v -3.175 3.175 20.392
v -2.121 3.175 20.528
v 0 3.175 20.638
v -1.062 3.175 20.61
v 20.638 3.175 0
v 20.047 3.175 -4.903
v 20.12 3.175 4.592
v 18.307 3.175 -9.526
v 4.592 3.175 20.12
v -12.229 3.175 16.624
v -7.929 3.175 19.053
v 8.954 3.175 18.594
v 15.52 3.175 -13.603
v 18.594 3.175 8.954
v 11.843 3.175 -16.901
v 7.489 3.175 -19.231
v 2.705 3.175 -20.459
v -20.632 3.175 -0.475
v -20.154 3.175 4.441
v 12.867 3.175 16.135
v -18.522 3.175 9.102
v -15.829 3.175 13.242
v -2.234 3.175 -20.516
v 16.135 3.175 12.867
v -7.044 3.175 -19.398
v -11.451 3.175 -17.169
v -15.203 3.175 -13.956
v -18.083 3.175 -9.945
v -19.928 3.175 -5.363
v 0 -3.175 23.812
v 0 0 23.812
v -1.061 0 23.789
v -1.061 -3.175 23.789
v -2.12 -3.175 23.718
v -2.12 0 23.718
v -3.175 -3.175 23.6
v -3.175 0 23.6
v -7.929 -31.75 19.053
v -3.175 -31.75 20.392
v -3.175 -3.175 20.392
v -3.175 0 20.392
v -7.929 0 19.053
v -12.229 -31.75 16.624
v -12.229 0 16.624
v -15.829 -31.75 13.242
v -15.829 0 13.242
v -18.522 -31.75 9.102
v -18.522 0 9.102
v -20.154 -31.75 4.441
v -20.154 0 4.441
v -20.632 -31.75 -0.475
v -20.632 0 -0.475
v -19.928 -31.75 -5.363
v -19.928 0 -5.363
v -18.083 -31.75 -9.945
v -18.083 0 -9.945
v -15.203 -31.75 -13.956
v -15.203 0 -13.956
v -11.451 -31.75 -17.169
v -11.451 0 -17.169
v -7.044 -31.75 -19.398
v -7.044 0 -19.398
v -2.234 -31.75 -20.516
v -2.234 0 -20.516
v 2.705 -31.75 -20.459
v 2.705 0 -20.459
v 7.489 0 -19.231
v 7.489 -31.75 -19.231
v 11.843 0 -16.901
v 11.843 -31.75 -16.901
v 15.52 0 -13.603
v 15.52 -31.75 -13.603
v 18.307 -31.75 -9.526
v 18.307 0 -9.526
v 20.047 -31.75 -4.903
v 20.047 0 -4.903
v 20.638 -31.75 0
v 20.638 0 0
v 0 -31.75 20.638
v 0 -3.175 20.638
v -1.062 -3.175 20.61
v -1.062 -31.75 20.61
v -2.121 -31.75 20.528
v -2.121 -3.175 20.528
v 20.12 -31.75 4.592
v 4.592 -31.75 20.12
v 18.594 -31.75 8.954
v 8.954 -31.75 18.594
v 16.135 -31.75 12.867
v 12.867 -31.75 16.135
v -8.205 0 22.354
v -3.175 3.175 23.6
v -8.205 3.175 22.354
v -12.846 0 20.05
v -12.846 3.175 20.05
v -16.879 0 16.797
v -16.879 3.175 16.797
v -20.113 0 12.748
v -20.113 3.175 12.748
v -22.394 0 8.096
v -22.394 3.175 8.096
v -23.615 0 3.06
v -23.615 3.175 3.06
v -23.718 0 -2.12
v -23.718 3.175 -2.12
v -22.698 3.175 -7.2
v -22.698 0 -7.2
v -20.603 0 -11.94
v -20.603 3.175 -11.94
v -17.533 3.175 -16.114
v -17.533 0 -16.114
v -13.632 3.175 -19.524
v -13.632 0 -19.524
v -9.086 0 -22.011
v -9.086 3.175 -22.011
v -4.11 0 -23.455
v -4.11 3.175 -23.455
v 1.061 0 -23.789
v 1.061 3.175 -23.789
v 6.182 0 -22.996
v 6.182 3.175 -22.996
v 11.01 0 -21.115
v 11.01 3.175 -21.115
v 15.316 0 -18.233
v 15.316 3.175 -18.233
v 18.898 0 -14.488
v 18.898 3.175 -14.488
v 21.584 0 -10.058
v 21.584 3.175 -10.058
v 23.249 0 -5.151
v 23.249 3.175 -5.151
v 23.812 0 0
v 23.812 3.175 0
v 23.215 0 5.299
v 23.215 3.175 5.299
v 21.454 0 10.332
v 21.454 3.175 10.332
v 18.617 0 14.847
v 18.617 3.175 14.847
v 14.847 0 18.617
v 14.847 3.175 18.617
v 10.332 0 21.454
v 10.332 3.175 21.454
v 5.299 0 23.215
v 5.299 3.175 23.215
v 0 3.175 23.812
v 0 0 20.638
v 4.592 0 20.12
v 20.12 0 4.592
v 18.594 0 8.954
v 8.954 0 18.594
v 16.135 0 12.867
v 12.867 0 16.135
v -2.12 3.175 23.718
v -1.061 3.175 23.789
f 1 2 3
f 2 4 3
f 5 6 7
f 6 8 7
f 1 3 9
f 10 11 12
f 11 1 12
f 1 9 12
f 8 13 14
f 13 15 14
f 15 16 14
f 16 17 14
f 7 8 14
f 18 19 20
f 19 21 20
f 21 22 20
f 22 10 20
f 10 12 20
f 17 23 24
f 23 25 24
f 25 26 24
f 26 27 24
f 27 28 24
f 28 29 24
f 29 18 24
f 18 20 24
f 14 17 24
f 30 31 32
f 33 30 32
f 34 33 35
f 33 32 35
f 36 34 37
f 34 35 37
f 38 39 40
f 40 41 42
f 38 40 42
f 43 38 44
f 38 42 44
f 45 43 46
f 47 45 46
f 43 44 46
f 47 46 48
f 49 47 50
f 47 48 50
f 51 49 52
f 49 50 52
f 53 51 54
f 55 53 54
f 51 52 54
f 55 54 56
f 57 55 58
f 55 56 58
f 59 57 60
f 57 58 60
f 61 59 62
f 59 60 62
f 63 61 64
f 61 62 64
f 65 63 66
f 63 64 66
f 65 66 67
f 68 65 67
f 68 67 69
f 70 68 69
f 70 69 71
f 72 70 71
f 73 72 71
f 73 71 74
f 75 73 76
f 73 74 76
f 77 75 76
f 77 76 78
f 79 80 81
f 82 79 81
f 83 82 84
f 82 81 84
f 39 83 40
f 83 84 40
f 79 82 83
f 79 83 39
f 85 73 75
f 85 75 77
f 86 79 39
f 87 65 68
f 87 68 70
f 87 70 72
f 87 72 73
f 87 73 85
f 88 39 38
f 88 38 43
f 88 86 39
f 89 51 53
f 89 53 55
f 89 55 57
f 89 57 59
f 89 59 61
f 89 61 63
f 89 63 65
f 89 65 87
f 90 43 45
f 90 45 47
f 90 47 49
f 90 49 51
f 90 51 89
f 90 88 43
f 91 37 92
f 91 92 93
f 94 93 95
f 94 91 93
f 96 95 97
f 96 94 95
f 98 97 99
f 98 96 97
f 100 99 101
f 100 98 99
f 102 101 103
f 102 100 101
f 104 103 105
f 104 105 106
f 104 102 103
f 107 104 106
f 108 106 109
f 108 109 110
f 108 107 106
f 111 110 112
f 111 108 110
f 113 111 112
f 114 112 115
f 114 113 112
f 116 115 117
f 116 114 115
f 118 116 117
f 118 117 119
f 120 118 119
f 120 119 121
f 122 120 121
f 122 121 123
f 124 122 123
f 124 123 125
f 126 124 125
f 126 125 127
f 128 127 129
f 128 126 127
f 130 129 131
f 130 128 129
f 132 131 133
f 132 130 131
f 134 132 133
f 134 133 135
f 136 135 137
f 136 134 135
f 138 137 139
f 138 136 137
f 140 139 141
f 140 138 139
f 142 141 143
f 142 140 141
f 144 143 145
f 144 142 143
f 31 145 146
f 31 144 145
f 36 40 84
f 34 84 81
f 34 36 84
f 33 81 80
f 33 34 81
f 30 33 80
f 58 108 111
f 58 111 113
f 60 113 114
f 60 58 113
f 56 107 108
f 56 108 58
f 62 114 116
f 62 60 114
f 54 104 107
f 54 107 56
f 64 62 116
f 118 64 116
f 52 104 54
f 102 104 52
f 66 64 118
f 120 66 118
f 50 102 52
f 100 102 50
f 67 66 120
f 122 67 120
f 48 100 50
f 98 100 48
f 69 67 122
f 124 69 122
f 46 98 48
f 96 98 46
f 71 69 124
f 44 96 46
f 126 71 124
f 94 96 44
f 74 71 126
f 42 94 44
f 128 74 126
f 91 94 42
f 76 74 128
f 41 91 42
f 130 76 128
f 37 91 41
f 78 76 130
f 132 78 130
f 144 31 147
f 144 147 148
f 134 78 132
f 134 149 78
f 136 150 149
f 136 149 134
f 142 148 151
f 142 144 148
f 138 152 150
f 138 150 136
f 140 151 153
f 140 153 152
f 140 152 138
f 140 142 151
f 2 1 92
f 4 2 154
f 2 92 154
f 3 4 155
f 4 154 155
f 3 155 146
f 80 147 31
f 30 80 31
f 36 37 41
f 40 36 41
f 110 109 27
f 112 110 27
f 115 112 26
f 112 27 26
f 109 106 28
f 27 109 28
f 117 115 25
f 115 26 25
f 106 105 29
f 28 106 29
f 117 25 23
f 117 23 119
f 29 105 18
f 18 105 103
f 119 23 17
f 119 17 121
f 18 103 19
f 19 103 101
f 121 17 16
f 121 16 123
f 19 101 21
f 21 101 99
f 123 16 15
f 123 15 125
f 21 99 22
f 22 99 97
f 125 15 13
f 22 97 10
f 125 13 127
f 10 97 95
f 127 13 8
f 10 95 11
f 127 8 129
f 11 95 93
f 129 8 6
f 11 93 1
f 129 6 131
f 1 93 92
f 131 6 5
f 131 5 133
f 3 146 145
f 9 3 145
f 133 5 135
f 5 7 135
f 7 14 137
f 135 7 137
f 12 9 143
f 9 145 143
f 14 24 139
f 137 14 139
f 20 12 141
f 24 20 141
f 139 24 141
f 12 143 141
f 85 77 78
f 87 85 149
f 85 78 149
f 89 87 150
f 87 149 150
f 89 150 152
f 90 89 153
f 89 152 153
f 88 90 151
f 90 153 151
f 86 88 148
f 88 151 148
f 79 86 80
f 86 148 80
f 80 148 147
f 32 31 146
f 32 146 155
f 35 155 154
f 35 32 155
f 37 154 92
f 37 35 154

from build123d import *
from build123d import SkipClean  # not in build123d's __all__

# Parameters (mm, degrees)
F3_DEPTH = 3.175
F4_DEPTH = 31.75
F5_DEPTH = 3.175
F6_DEPTH = 3.175


# Not quite as in the source:
# - a length typed as a fraction of an inch, garbled in the dataset ("3 / 203.2 mm" for 3/8 in), is restored


with BuildPart() as f3:
    # F2 (on Front) → F3 (new body)
    with BuildSketch(Plane.XZ):
        with BuildLine():
            Line((-3.175, 23.5998841364), (-3.175, 20.3918067186))
            ThreePointArc((-3.175, 20.3918067186), (-1.5922460699, 20.5759849996), (0, 20.6375))
            Line((0, 20.6375), (0, 23.8125))
            ThreePointArc((0, 23.8125), (-1.591055507, 23.7592865765), (-3.175, 23.5998841364))
        make_face()
        with BuildLine():
            ThreePointArc((20.6375, 0), (-13.4235305294, -15.6753065161), (-3.175, 20.3918067186))
            Line((-3.175, 20.3918067186), (-3.175, 23.5998841364))
            ThreePointArc((-3.175, 23.5998841364), (-15.6753065161, -17.9253987926), (23.8125, 0))
            ThreePointArc((23.8125, 0), (16.837980227, 16.837980227), (0, 23.8125))
            Line((0, 23.8125), (0, 20.6375))
            ThreePointArc((0, 20.6375), (14.5929161967, 14.5929161967), (20.6375, 0))
        make_face()
    extrude(amount=-F3_DEPTH)

    # F2 (on Front) → F4 (join)
    with BuildSketch(Plane.XZ):
        with BuildLine():
            ThreePointArc((0, 20.6375), (-1.5922460699, 20.5759849996), (-3.175, 20.3918067186))
            ThreePointArc((-3.175, 20.3918067186), (-13.4235305294, -15.6753065161), (20.6375, 0))
            ThreePointArc((20.6375, 0), (14.5929161967, 14.5929161967), (0, 20.6375))
        make_face()
    extrude(amount=F4_DEPTH)

    # F2 (on Front) → F5 (join)
    with BuildSketch(Plane.XZ):
        with BuildLine():
            Line((-3.175, 23.5998841364), (-3.175, 20.3918067186))
            ThreePointArc((-3.175, 20.3918067186), (-1.5922460699, 20.5759849996), (0, 20.6375))
            Line((0, 20.6375), (0, 23.8125))
            ThreePointArc((0, 23.8125), (-1.591055507, 23.7592865765), (-3.175, 23.5998841364))
        make_face()
    with SkipClean():  # cleaning this boolean's faces spoils the solid; the shape is the same uncleaned
        extrude(amount=F5_DEPTH)

    # F2 (on Front) → F6 (join)
    with BuildSketch(Plane.XZ):
        with BuildLine():
            ThreePointArc((0, 20.6375), (-1.5922460699, 20.5759849996), (-3.175, 20.3918067186))
            ThreePointArc((-3.175, 20.3918067186), (-13.4235305294, -15.6753065161), (20.6375, 0))
            ThreePointArc((20.6375, 0), (14.5929161967, 14.5929161967), (0, 20.6375))
        make_face()
        with BuildLine():
            Line((-3.175, 23.5998841364), (-3.175, 20.3918067186))
            ThreePointArc((-3.175, 20.3918067186), (-1.5922460699, 20.5759849996), (0, 20.6375))
            Line((0, 20.6375), (0, 23.8125))
            ThreePointArc((0, 23.8125), (-1.591055507, 23.7592865765), (-3.175, 23.5998841364))
        make_face()
    with SkipClean():  # cleaning this boolean's faces spoils the solid; the shape is the same uncleaned
        extrude(amount=-F6_DEPTH)


solid = f3.part
